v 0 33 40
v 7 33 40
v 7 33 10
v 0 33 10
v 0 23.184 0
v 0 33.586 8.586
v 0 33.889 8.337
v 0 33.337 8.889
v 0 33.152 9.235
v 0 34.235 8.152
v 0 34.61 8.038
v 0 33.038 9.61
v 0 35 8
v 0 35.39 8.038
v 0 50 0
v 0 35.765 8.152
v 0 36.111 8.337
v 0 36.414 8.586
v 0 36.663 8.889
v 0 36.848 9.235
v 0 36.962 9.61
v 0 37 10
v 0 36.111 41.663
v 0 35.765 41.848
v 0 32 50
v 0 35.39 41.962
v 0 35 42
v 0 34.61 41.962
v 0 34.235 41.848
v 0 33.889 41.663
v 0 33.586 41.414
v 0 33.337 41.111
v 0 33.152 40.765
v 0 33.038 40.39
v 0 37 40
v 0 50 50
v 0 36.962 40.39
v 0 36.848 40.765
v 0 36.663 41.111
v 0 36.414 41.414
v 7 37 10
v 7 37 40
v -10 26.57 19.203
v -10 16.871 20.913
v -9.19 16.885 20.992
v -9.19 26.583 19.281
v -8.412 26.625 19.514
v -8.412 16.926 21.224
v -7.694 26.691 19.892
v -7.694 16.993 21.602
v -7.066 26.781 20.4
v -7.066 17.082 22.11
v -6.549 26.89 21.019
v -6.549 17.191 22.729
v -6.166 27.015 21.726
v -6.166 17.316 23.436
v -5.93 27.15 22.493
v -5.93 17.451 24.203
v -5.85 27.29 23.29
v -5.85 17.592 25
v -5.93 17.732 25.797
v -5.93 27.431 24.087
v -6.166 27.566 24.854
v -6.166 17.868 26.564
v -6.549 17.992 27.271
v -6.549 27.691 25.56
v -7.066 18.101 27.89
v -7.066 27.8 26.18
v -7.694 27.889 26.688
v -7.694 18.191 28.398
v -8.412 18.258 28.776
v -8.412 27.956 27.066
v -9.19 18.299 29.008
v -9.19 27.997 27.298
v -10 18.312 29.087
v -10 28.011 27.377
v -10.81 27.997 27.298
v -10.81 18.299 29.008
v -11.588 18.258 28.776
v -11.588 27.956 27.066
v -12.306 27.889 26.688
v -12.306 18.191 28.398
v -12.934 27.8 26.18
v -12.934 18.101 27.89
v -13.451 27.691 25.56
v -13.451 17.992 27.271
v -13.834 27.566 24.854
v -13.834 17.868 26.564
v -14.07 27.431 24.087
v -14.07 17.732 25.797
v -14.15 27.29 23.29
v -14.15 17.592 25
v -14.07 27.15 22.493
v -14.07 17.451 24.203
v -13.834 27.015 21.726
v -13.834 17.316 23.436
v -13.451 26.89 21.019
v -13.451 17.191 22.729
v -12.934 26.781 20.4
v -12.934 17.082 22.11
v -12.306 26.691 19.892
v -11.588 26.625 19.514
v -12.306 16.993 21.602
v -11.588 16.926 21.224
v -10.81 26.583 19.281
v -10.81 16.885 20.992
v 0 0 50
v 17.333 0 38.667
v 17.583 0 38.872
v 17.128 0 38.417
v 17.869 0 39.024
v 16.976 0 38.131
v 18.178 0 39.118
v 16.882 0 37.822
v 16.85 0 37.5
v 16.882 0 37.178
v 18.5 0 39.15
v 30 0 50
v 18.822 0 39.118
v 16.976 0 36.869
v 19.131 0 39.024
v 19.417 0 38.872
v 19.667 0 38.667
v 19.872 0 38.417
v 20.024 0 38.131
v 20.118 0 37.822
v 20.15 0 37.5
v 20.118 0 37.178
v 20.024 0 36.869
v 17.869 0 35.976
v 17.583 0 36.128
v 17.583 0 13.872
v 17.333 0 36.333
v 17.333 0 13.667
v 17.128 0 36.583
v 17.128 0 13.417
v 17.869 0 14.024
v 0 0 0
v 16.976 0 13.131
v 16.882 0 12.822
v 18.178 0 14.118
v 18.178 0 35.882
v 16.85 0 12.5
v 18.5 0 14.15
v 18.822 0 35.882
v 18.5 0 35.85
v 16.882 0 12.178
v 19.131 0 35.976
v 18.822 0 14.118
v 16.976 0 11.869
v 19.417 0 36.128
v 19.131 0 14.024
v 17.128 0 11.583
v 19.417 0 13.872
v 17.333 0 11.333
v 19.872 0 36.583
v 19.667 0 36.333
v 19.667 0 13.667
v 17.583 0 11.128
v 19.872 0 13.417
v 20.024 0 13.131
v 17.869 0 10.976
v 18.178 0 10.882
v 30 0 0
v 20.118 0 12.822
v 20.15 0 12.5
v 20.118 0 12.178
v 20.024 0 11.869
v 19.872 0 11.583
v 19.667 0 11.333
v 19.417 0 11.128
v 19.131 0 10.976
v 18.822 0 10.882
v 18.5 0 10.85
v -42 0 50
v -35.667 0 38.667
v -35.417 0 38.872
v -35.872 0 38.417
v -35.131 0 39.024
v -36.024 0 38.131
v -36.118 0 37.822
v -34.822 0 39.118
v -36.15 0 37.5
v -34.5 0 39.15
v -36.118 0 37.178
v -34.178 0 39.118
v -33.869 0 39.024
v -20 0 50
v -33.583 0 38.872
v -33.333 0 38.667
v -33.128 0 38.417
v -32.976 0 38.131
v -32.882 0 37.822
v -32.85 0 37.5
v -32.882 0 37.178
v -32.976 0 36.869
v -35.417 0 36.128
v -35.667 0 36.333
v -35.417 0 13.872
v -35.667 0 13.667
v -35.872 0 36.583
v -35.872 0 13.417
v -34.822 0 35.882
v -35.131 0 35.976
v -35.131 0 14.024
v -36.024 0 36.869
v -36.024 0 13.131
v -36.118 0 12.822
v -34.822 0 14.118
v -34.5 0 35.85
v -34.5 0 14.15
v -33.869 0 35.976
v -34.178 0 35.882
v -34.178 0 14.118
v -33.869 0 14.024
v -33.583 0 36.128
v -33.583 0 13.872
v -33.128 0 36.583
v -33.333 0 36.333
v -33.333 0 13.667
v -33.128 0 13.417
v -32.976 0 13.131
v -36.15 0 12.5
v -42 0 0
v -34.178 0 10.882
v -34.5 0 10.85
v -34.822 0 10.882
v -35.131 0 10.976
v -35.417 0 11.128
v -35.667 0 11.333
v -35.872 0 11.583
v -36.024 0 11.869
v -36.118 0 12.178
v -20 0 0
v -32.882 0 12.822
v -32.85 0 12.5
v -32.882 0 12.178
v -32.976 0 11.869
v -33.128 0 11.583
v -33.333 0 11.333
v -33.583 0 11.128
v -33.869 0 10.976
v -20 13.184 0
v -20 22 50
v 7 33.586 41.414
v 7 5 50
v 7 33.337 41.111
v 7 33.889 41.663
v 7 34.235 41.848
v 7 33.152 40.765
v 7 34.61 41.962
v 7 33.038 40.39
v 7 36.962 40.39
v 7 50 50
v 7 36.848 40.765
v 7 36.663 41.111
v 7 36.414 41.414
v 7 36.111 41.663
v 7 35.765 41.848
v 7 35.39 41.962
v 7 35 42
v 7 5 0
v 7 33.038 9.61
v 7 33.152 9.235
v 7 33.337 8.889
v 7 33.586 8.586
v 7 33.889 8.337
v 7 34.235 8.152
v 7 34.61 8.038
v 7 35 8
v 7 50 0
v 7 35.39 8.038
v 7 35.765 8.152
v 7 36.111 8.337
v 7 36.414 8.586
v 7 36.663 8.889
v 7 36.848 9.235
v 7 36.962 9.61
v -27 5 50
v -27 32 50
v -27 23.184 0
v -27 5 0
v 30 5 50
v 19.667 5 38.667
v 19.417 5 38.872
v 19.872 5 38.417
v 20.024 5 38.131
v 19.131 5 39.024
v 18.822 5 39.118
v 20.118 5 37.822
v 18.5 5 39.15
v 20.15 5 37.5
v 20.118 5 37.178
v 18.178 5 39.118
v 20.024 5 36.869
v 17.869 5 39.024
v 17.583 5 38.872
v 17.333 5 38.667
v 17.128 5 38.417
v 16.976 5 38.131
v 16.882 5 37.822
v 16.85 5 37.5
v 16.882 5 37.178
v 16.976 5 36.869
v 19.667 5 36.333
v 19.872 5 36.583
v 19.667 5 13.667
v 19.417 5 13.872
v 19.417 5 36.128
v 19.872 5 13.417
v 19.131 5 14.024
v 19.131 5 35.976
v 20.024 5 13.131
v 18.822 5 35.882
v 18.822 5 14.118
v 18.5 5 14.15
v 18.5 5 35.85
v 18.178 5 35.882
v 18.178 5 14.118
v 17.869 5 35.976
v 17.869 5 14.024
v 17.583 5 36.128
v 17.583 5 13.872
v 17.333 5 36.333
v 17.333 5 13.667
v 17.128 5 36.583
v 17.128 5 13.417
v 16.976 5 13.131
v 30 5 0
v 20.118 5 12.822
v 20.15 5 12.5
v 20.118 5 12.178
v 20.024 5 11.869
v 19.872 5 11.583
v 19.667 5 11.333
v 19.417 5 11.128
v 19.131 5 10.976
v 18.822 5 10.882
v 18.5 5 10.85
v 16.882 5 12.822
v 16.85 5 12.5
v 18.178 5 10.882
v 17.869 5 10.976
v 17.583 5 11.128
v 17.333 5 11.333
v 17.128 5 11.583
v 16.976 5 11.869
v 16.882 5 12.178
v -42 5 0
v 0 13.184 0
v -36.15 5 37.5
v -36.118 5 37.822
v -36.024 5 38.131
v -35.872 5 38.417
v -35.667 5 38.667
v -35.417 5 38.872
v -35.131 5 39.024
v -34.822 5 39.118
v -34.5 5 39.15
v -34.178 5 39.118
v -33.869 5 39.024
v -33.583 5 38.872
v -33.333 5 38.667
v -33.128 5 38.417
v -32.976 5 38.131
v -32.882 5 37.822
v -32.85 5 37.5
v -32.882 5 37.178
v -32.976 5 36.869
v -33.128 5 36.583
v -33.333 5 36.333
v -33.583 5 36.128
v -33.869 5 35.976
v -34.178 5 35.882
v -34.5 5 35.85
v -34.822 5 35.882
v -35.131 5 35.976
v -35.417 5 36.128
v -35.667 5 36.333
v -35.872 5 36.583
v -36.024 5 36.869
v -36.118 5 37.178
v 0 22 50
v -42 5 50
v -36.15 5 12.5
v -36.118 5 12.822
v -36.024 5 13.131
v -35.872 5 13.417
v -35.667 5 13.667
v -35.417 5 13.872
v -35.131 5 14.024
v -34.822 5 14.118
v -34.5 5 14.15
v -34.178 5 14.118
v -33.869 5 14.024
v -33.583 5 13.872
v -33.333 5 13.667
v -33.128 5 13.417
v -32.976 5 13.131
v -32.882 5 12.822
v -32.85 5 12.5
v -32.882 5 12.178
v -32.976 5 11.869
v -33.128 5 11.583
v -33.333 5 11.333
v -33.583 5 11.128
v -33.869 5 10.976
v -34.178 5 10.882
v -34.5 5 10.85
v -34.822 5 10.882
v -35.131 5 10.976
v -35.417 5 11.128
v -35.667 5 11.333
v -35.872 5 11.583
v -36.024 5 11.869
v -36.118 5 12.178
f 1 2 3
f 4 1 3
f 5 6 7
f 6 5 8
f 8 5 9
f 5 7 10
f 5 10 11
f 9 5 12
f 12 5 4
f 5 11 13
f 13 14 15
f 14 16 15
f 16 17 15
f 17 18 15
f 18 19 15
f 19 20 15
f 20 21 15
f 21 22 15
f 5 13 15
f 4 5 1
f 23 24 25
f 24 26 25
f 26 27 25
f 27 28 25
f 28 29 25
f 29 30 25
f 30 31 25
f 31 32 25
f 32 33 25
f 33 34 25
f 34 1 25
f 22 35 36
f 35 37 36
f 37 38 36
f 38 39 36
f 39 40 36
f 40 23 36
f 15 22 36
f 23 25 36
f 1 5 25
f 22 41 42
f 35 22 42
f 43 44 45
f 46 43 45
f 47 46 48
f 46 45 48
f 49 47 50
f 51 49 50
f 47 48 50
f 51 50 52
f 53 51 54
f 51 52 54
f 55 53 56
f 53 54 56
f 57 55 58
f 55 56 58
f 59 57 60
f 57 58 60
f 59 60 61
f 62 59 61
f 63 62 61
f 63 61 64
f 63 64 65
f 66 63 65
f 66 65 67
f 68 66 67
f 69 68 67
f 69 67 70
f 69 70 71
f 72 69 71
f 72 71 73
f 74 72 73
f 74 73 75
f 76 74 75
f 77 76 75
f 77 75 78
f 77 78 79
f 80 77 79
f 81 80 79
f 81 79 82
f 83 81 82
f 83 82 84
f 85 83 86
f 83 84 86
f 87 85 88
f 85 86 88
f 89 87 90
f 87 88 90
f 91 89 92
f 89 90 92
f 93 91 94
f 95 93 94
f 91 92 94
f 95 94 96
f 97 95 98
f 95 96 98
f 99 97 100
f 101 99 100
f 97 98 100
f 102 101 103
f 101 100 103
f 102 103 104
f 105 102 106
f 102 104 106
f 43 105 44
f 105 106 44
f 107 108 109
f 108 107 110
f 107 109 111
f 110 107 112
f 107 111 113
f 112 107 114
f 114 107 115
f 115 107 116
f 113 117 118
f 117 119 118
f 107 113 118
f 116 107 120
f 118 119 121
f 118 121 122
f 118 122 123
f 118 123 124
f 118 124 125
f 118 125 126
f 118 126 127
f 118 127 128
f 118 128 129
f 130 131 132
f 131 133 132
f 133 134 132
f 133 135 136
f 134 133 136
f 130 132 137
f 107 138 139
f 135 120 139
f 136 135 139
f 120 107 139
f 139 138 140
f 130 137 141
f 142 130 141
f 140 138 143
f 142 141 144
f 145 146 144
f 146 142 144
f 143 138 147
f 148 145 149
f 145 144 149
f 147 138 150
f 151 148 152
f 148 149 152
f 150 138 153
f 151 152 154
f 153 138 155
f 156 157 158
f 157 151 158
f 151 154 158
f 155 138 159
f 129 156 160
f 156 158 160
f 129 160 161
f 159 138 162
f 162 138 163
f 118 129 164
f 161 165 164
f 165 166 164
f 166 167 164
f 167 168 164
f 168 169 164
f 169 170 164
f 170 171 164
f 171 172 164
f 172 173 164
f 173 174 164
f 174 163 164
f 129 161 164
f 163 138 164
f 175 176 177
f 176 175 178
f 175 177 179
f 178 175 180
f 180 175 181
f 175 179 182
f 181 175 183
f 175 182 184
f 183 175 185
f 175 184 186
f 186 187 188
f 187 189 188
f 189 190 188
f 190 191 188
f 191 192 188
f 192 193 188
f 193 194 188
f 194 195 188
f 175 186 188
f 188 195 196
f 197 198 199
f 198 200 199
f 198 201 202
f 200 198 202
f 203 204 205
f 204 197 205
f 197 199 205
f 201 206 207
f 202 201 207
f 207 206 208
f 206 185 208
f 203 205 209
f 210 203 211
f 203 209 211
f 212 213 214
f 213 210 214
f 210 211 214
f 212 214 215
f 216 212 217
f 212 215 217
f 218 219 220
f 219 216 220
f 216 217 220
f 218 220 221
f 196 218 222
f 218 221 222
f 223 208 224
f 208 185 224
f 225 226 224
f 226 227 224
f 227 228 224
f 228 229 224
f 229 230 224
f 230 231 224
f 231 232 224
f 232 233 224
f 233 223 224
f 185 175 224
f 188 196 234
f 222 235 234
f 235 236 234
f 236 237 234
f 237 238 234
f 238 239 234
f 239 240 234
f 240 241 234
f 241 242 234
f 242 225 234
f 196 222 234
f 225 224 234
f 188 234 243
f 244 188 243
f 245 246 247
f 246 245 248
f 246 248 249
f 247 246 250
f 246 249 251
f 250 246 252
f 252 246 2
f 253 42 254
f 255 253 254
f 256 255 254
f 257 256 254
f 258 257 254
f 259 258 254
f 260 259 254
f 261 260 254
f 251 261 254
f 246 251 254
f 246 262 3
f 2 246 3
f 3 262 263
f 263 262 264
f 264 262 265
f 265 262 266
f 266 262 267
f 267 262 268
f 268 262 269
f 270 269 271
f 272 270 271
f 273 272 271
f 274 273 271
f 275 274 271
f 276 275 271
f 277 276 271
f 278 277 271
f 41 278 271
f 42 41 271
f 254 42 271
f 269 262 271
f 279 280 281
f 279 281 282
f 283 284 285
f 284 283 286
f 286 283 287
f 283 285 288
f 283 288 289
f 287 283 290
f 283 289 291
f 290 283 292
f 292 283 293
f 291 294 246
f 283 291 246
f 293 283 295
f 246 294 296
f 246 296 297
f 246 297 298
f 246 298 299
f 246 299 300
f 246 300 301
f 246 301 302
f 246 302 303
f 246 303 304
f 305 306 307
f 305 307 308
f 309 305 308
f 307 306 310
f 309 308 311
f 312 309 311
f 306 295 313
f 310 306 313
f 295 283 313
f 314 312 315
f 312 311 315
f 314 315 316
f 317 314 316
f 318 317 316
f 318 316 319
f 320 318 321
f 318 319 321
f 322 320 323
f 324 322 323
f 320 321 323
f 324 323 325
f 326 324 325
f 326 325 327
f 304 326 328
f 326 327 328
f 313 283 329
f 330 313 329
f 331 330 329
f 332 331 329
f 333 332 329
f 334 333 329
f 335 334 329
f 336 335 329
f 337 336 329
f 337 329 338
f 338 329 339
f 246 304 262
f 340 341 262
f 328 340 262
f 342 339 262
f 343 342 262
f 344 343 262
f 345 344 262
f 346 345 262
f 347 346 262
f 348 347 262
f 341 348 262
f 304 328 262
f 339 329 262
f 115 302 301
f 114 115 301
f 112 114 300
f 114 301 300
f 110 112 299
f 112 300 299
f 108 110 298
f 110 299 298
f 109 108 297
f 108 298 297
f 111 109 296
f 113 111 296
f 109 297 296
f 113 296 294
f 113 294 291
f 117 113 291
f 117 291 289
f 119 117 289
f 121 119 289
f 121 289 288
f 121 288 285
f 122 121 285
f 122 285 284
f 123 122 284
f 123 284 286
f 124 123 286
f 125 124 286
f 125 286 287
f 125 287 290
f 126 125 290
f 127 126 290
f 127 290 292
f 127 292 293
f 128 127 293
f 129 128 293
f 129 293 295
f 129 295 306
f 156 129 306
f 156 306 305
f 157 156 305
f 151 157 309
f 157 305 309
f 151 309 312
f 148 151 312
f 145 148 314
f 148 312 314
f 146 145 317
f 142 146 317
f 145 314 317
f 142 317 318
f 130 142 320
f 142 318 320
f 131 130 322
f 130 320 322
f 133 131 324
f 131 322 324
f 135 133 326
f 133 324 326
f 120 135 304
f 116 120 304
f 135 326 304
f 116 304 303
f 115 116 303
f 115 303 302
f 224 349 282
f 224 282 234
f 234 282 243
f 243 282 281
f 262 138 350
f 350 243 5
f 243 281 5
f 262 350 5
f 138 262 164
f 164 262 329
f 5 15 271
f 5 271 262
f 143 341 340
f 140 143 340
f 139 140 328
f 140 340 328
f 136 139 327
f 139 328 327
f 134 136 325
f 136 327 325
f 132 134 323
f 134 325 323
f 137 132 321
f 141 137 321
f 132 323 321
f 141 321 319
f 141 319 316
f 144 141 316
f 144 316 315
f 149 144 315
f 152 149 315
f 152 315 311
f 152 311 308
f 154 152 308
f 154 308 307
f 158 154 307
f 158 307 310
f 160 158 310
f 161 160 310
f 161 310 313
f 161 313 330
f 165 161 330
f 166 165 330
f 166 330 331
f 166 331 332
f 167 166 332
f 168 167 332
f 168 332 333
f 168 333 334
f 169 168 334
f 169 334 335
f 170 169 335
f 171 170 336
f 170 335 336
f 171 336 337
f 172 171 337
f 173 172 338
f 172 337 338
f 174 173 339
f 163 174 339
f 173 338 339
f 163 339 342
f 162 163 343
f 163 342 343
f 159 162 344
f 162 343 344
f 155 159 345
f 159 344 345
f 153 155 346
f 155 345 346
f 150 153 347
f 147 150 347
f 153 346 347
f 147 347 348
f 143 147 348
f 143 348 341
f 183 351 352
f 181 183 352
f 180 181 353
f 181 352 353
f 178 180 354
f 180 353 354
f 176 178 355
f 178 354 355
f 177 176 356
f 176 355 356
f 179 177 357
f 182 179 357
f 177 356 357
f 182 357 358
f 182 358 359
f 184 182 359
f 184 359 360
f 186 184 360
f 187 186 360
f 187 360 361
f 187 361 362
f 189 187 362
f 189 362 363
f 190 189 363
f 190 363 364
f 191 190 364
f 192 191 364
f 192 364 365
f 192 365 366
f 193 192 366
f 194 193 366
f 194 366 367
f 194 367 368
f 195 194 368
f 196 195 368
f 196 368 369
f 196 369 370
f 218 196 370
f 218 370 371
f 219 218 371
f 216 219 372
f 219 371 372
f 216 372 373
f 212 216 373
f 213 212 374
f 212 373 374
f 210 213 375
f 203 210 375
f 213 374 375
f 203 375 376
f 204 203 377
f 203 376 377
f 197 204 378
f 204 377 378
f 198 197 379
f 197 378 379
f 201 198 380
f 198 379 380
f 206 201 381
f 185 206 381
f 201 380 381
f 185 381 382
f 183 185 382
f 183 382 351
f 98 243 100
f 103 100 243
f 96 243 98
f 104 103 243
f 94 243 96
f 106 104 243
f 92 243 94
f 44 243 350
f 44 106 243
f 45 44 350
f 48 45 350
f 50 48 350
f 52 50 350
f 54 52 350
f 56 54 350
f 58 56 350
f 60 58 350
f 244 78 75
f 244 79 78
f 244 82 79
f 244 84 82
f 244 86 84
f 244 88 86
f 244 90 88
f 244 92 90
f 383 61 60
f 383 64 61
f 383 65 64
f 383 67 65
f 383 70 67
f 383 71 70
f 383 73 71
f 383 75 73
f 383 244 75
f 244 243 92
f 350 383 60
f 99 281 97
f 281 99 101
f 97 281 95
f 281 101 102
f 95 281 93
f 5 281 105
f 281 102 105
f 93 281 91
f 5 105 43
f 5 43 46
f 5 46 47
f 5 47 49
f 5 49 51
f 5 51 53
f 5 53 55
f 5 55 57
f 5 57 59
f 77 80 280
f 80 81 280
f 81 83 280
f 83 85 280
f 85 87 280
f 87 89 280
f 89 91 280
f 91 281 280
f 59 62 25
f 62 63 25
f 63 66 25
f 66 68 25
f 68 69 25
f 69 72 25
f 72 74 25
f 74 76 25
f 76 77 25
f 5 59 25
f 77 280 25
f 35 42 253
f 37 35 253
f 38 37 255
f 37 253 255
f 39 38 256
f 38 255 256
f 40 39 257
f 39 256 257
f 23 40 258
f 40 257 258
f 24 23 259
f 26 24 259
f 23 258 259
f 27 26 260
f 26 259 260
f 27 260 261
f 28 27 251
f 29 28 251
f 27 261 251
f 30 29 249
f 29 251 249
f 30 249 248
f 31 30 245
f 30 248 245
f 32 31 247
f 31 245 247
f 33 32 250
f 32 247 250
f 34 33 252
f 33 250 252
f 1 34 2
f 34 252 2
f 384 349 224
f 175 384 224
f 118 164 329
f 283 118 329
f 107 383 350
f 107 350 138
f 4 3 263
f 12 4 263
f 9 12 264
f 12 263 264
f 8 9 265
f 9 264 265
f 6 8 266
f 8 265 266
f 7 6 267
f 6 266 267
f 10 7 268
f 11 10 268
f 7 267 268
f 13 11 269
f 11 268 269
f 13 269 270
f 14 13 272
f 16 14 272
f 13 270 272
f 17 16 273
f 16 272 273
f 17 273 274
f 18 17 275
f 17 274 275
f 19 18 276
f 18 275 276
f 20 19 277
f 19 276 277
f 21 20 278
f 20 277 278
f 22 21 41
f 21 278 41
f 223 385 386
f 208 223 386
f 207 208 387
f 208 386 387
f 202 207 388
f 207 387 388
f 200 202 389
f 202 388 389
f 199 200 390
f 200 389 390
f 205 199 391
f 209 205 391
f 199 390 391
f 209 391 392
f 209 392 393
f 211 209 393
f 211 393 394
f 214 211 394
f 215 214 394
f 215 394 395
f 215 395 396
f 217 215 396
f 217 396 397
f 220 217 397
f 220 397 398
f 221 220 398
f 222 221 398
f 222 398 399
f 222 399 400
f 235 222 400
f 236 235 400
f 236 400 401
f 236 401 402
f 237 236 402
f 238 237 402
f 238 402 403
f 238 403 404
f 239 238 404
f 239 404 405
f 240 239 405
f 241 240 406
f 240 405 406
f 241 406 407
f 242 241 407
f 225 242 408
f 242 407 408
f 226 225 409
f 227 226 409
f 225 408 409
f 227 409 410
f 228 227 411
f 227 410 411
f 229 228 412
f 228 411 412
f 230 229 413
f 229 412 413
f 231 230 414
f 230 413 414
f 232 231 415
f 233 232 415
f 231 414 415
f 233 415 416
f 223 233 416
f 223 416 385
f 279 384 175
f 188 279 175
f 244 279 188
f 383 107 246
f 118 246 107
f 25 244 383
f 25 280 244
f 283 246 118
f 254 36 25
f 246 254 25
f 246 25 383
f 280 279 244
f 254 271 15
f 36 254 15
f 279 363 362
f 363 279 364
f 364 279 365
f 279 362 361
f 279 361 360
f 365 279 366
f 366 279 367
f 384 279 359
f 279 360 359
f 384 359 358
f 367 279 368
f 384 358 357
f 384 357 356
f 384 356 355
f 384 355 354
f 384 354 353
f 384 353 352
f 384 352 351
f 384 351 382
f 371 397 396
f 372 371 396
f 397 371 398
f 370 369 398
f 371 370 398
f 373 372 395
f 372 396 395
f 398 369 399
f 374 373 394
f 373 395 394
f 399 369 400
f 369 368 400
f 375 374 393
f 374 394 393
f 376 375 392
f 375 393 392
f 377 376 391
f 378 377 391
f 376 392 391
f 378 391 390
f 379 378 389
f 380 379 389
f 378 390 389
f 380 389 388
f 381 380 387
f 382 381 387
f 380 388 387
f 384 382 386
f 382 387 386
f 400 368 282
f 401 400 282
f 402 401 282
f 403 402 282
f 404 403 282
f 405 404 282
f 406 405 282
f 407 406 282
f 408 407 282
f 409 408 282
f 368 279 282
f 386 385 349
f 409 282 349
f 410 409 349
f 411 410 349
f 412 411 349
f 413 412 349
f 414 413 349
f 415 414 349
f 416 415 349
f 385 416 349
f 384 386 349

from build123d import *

# Parameters (mm, degrees)
RESSALTO_EXTRUS_O1_DEPTH = 50
CORTE_EXTRUS_O1_DEPTH    = 50
ESBO_O5_R                = 1.65
CORTE_EXTRUS_O2_DEPTH    = 10
ESBO_O7_W                = 27
ESBO_O7_H                = 9.386843201
ESBO_O7_W_2              = 20
ESBO_O7_H_2              = 15
CORTE_EXTRUS_O3_DEPTH    = 84.527706575
ESBO_O8_R                = 4.15
CORTE_EXTRUS_O4_DEPTH    = 77.677309979


with BuildPart() as part:
    # Esboço2 → Ressalto-extrusão1 (new body)
    with BuildSketch(Plane.XY):
        Polygon((0, 0), (30, 0), (30, 5), (7, 5), (7, 50), (0, 50), (0, 32), (-20, 32), (-27, 32), (-27, 5), (-42, 5), (-42, 0), (-20, 0), (-20, 7), (0, 7), align=None)
    extrude(amount=RESSALTO_EXTRUS_O1_DEPTH)

    # Esboço3 → Corte-extrusão1 (cut)
    with BuildSketch(Plane(origin=(7, 0, 0), x_dir=(0, 0, -1), z_dir=(1, 0, 0))):
        with BuildLine():
            Line((-40, 33), (-10, 33))
            ThreePointArc((-10, 33), (-8, 35), (-10, 37))
            Line((-10, 37), (-40, 37))
            ThreePointArc((-40, 37), (-42, 35), (-40, 33))
        make_face()
    extrude(amount=-CORTE_EXTRUS_O1_DEPTH, mode=Mode.SUBTRACT)

    # Esboço5 → Corte-extrusão2 (cut)
    with BuildSketch(Plane(origin=(0, 5, 0), x_dir=(1, 0, 0), z_dir=(0, 1, 0))):
        with Locations(Location((18.5, -37.5, 0), (0, 0, 180))):
            Circle(ESBO_O5_R)
        with Locations(Location((18.5, -12.5, 0), (0, 0, 180))):
            Circle(ESBO_O5_R)
        with Locations(Location((-34.5, -12.5, 0), (0, 0, 180))):
            Circle(ESBO_O5_R)
        with Locations(Location((-34.5, -37.5, 0), (0, 0, 180))):
            Circle(ESBO_O5_R)
    extrude(amount=-CORTE_EXTRUS_O2_DEPTH, mode=Mode.SUBTRACT)

    # Esboço7 → Corte-extrusão3 (cut, through all, along a direction that is not the sketch's normal)
    with BuildSketch(Plane.XY.offset(50)):
        with Locations((-13.5, 36.693421601)):
            Rectangle(ESBO_O7_W, ESBO_O7_H)
        with Locations((-10, 14.5)):
            Rectangle(ESBO_O7_W_2, ESBO_O7_H_2)
    extrude(amount=-CORTE_EXTRUS_O3_DEPTH, dir=(0, 0.1736481776669347, 0.9848077530122074), mode=Mode.SUBTRACT)

    # Esboço8 → Corte-extrusão4 (cut, through all)
    with BuildSketch(Plane(origin=(0, 12.786115246, -2.254537096), x_dir=(1, 0, 0), z_dir=(0, -0.9848077530122075, 0.1736481776669347))):
        with Locations(Location((-10, 27.674982262, 0), (0, 0, 270))):
            Circle(ESBO_O8_R)
    extrude(amount=-CORTE_EXTRUS_O4_DEPTH, mode=Mode.SUBTRACT)


solid = part.part
